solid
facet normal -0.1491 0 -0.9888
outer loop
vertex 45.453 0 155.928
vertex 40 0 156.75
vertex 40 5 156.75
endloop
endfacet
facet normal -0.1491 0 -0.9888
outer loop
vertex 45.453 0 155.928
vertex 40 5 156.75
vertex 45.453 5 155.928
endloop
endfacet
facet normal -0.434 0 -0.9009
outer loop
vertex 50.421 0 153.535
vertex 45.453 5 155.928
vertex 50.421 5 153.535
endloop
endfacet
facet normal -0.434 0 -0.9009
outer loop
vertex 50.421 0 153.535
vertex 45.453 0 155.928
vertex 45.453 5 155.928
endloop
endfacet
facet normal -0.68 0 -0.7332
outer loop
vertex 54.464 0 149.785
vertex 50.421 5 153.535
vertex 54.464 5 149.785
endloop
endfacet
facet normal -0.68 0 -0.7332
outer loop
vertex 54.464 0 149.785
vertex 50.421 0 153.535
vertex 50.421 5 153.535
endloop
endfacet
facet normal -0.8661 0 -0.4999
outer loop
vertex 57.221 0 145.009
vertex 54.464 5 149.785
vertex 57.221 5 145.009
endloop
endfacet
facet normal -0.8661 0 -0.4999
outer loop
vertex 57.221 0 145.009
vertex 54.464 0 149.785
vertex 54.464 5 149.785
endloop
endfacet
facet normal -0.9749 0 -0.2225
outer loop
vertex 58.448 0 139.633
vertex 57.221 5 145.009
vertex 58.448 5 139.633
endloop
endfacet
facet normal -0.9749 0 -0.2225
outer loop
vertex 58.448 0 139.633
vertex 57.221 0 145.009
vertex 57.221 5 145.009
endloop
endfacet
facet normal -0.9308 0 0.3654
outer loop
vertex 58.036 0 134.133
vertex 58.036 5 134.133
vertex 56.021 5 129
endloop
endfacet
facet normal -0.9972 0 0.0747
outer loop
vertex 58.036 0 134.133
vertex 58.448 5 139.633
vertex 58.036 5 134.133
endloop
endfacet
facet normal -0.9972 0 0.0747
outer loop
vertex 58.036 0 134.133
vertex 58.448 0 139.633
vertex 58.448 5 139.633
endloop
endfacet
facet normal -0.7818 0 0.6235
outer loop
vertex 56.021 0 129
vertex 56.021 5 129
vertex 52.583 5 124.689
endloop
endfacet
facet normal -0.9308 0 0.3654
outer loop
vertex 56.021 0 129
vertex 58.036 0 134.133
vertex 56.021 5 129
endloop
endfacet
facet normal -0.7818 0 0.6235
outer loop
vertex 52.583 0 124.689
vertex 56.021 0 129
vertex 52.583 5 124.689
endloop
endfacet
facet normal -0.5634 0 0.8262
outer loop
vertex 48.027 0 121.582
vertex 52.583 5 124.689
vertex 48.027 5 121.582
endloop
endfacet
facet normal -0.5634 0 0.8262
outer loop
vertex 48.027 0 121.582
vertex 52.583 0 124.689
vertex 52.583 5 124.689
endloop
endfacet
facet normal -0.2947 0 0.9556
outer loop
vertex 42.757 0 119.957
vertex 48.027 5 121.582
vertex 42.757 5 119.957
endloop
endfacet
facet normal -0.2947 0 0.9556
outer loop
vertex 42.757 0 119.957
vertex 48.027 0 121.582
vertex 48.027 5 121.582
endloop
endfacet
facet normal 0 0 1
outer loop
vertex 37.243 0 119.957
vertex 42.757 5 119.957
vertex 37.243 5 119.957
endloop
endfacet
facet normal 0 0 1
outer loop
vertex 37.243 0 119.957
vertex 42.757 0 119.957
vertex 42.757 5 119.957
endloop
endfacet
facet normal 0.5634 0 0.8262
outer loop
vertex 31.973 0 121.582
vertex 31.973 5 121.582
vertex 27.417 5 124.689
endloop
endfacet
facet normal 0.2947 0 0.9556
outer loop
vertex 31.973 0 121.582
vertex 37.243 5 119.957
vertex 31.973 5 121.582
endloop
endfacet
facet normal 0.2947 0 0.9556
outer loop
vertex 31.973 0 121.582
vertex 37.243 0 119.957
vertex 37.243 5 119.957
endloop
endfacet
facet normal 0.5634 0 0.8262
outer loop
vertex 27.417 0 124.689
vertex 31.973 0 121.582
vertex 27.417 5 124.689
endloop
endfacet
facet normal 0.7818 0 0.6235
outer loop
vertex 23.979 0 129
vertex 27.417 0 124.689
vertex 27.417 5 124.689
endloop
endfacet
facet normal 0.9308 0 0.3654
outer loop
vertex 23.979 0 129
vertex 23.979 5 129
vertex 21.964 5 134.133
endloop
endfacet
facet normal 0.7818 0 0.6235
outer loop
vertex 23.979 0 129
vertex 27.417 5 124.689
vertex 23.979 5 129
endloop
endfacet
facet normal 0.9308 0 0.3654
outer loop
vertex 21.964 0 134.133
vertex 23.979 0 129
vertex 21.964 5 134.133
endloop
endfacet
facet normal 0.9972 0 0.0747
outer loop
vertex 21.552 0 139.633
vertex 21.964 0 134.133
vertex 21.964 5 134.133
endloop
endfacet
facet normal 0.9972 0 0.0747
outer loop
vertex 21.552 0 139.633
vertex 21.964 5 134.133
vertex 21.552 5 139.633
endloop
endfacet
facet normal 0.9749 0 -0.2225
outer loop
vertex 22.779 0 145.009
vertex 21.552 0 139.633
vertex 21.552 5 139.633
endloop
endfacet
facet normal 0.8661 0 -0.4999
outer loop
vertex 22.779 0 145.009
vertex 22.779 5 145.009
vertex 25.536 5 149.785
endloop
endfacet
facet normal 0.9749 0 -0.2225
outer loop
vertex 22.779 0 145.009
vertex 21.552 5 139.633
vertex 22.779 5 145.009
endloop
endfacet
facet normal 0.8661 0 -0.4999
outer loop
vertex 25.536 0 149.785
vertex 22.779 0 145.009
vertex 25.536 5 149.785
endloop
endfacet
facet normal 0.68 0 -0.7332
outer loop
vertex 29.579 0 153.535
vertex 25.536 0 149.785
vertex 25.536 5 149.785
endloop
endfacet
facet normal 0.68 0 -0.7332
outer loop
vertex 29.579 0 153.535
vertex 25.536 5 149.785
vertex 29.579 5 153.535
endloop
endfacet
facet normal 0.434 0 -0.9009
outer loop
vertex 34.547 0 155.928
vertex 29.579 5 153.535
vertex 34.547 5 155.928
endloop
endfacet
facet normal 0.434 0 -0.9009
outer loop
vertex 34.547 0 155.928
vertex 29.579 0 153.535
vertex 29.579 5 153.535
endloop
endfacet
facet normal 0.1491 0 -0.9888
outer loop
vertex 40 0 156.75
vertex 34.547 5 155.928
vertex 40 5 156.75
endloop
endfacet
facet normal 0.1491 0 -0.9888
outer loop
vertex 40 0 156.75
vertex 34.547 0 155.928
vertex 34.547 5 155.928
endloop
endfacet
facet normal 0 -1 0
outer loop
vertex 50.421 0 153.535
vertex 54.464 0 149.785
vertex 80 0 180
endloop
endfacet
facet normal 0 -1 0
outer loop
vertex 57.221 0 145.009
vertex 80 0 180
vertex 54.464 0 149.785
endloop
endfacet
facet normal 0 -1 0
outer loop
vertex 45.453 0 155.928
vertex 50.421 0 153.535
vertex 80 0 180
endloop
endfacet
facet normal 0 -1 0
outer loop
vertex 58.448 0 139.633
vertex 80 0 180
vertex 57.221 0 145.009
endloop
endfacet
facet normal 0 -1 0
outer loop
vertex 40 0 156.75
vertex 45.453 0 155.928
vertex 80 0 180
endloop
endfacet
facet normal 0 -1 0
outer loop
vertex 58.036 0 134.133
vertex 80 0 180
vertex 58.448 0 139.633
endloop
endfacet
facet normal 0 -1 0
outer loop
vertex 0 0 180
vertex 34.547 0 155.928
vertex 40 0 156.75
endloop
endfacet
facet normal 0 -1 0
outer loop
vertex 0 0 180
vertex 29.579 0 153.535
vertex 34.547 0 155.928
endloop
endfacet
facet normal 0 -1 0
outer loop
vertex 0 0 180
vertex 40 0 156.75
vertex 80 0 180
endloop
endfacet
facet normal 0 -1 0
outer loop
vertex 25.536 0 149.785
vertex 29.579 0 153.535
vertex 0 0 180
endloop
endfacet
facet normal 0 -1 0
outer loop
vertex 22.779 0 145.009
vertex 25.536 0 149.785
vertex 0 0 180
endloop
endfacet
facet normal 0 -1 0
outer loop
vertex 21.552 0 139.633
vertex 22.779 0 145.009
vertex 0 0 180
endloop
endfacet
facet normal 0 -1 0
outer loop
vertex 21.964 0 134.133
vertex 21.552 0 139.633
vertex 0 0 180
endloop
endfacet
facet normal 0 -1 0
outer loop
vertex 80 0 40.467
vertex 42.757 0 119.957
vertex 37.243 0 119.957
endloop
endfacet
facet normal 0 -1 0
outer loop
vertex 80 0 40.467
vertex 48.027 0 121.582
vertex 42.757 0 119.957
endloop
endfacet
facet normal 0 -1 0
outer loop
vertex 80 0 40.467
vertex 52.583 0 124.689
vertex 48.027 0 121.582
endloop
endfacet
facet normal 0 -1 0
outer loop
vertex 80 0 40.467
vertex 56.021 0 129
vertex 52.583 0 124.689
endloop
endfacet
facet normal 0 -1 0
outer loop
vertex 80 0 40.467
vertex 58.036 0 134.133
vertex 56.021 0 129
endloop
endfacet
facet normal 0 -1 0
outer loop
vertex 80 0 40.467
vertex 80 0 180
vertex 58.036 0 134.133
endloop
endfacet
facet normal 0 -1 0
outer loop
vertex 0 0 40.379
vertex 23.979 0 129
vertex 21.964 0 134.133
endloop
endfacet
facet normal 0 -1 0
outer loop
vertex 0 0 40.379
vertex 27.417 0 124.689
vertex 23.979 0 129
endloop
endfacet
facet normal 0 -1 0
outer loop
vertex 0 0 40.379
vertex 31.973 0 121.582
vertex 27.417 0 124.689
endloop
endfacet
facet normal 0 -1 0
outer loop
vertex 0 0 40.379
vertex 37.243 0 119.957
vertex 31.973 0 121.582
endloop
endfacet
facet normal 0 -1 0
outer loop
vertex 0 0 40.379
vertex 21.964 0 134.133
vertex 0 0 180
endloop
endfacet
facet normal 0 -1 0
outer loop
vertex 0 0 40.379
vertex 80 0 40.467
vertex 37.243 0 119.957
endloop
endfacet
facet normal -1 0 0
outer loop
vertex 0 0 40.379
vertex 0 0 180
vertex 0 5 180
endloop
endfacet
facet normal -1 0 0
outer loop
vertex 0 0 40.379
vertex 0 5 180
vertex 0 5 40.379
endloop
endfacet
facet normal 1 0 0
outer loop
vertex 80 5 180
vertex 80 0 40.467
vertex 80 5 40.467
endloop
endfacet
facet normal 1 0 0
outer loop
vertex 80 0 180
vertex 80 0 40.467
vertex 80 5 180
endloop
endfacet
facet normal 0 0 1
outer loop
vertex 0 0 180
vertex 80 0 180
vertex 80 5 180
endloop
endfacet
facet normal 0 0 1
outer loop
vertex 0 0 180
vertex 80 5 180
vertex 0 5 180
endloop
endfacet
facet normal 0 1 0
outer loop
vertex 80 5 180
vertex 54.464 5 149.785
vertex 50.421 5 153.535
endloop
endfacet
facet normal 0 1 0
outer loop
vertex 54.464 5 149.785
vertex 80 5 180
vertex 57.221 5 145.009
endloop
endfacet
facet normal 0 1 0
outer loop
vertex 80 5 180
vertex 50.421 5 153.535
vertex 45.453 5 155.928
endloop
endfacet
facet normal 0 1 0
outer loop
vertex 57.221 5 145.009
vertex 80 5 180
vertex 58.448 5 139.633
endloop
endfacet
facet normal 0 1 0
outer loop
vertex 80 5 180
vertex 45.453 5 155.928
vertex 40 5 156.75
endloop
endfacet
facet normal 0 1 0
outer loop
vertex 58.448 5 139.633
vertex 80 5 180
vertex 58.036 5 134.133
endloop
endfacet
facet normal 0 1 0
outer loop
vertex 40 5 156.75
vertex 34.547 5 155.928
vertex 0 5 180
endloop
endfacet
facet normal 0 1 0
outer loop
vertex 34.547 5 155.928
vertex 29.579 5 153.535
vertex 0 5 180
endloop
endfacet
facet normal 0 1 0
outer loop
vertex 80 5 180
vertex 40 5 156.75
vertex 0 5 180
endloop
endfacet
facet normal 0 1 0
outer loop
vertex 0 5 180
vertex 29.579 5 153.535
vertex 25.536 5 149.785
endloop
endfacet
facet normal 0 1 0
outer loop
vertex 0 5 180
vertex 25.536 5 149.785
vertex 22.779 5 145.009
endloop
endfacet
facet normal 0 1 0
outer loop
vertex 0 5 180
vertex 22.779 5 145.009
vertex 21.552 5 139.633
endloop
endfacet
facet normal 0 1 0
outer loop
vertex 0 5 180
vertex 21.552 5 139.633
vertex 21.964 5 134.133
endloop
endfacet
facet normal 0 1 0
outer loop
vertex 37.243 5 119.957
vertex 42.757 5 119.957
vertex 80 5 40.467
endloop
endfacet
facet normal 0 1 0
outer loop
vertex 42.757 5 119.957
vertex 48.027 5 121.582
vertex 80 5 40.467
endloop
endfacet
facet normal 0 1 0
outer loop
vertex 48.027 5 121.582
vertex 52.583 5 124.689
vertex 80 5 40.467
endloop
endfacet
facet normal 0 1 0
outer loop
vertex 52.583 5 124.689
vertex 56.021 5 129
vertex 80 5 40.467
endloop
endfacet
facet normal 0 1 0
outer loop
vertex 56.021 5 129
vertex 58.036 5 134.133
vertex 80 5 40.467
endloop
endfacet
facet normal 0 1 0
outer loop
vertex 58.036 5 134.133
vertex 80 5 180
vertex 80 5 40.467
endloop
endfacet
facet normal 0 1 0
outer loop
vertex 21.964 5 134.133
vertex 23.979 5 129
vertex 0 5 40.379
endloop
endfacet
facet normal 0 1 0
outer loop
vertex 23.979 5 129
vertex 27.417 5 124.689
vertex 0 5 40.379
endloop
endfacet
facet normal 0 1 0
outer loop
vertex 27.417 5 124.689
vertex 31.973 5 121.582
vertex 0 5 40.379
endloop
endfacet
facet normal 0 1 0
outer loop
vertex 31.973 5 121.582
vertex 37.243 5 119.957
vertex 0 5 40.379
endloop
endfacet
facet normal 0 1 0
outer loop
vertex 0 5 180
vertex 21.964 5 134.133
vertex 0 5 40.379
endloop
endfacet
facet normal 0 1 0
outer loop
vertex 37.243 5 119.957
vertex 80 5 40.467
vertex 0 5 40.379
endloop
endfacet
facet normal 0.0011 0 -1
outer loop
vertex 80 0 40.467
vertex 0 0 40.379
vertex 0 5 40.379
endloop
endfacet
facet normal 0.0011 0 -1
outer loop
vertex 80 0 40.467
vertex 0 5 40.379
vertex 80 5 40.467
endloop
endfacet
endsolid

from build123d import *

# Parameters (mm, degrees)
SKETCH1_R               = 6
SKETCH1_R_2             = 1.525
BOSS_EXTRUDE1_DEPTH     = 5
CUT_EXTRUDE1_DEPTH      = 198.040604952
CUT_EXTRUDE1_DEPTH_BACK = 198.040604952
SKETCH2_R               = 18.5


with BuildPart() as part:
    # Sketch1 → Boss-Extrude1 (new body)
    with BuildSketch(Plane(origin=(0, 0, 0), x_dir=(1, 0, 0), z_dir=(0, 1, 0))):
        Polygon((0, -40.379460215), (80, -40.467284232), (80, -180), (0, -180), align=None)
        with Locations(Location((40, -131.25, 0), (0, 0, 270))):
            Circle(SKETCH1_R, mode=Mode.SUBTRACT)
        with Locations(Location((24.5, -138.25, 0), (0, 0, 270))):
            Circle(SKETCH1_R_2, mode=Mode.SUBTRACT)
        with Locations(Location((55.5, -138.25, 0), (0, 0, 270))):
            Circle(SKETCH1_R_2, mode=Mode.SUBTRACT)
        with Locations(Location((32.25, -124.826606241, 0), (0, 0, 270))):
            Circle(SKETCH1_R_2, mode=Mode.SUBTRACT)
        with Locations(Location((47.75, -124.826606241, 0), (0, 0, 270))):
            Circle(SKETCH1_R_2, mode=Mode.SUBTRACT)
    extrude(amount=BOSS_EXTRUDE1_DEPTH)

    # Sketch2 → Cut-Extrude1 (cut, two sides: drawn at the far end of the back side and taken through both)
    with BuildSketch(Plane(origin=(0, 5, 0), x_dir=(1, 0, 0), z_dir=(0, 1, 0)).offset(-CUT_EXTRUDE1_DEPTH_BACK)):
        with Locations(Location((40, -138.25, 0), (0, 0, 270))):
            Circle(SKETCH2_R)
    extrude(amount=CUT_EXTRUDE1_DEPTH + CUT_EXTRUDE1_DEPTH_BACK, mode=Mode.SUBTRACT)


solid = part.part
